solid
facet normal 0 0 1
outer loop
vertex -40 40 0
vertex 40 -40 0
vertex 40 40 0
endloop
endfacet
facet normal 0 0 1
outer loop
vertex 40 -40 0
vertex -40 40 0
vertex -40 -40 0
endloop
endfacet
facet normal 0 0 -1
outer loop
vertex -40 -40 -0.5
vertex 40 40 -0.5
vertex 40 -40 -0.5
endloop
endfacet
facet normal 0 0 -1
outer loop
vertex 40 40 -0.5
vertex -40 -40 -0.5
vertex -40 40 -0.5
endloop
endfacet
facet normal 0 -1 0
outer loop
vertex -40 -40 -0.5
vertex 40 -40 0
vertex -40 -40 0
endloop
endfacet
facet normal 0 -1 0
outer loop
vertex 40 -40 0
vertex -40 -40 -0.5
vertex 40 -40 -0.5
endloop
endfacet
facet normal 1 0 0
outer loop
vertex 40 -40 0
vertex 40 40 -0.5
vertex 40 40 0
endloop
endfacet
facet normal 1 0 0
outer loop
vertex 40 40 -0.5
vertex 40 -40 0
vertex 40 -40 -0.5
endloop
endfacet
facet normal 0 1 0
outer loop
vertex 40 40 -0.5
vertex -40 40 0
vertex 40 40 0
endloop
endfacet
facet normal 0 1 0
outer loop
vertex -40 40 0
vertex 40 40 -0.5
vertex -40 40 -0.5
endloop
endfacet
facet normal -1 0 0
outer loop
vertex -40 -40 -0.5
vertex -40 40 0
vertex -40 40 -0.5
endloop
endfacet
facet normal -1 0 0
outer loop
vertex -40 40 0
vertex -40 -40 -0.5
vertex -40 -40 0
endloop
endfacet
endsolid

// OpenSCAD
//translate([121, 0, 0])

/*difference() {
    cube([100, 100, 1], center = true);
    cube([80, 80, 2], center = true);
}*/


r = 80/897;

th = 0.5;
translate([0,0,-th/2])
cube([80,80,th], center=true);


intersection()
{
    mirror([1, 0, 0])
    scale([r, r, r*10])
    translate([0, 0, 100])
    surface(file="button1.png", center=true, convexity=1, invert = true);
    
    cube([101, 101, 2*2], center=true);
}


/*    
difference() {
    cube([103, 103, 1.6], center = true);
    cube([101, 101, 4], center = true);
}
*/
